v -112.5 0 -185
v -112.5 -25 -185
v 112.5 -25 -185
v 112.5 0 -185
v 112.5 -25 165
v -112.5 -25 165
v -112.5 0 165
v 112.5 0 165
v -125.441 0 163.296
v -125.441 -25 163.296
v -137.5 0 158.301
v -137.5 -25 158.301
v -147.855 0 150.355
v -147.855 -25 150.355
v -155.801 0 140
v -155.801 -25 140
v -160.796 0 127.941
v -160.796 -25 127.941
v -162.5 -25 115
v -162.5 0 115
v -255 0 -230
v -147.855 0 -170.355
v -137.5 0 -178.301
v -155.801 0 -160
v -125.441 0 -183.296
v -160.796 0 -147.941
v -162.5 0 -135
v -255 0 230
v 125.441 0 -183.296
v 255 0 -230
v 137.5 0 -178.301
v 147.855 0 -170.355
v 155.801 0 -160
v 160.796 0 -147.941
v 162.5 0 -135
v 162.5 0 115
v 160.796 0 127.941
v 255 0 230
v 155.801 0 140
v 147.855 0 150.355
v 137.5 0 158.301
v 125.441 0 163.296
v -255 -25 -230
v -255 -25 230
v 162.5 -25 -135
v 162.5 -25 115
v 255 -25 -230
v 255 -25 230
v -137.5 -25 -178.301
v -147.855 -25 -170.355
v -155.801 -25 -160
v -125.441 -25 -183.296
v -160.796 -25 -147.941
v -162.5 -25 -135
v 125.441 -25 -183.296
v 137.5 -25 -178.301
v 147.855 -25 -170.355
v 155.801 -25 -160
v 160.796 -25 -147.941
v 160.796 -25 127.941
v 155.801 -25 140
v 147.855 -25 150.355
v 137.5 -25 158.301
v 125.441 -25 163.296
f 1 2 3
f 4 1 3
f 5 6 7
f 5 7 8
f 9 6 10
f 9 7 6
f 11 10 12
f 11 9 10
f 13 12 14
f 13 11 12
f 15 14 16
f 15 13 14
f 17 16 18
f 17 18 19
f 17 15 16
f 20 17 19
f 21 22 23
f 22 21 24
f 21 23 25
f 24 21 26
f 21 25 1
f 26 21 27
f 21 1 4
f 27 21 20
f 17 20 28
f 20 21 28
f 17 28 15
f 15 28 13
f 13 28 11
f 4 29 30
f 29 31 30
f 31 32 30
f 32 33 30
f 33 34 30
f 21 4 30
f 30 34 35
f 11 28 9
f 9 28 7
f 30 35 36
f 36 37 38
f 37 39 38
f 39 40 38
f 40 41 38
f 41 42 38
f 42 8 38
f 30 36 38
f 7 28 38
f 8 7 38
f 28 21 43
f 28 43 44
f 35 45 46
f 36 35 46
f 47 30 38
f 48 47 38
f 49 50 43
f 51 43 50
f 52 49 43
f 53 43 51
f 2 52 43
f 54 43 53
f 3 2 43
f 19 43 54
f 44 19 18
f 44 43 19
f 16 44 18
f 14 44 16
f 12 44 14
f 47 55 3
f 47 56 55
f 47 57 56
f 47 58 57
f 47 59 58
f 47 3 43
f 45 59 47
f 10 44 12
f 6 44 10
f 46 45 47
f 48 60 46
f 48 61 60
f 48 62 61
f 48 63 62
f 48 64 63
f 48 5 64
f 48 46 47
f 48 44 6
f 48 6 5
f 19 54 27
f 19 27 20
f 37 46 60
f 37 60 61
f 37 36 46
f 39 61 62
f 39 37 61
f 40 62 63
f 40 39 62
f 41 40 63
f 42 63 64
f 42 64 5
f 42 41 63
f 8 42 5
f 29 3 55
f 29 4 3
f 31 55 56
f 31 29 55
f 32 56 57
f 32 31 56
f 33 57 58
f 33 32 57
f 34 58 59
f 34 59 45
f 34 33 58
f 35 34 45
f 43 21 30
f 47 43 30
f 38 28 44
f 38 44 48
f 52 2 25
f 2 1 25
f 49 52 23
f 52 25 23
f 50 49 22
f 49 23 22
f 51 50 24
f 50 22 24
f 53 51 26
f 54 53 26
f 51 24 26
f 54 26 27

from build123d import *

# Parameters (mm, degrees)
F0_W     = 510
F0_H     = 460
F1_DEPTH = 25
F2_W     = 325
F2_H     = 350
F3_DEPTH = 25
F4_R     = 50


with BuildPart() as f1:
    # F0 (on Front) → F1 (new body)
    with BuildSketch(Plane.XZ):
        Rectangle(F0_W, F0_H)
    extrude(amount=F1_DEPTH)

    # F2 (on face) → F3 (cut)
    with BuildSketch(Plane.XZ.offset(25)):
        with Locations((0, -10)):
            Rectangle(F2_W, F2_H)
    extrude(amount=-F3_DEPTH, mode=Mode.SUBTRACT)

    # F4
    f4_edges = [f1.edges().sort_by_distance(p)[0] for p in [
        (-162.5, -12.5, 165),
        (162.5, -12.5, 165),
        (-162.5, -12.5, -185),
        (162.5, -12.5, -185),
    ]]
    fillet(f4_edges, radius=F4_R)


solid = f1.part
